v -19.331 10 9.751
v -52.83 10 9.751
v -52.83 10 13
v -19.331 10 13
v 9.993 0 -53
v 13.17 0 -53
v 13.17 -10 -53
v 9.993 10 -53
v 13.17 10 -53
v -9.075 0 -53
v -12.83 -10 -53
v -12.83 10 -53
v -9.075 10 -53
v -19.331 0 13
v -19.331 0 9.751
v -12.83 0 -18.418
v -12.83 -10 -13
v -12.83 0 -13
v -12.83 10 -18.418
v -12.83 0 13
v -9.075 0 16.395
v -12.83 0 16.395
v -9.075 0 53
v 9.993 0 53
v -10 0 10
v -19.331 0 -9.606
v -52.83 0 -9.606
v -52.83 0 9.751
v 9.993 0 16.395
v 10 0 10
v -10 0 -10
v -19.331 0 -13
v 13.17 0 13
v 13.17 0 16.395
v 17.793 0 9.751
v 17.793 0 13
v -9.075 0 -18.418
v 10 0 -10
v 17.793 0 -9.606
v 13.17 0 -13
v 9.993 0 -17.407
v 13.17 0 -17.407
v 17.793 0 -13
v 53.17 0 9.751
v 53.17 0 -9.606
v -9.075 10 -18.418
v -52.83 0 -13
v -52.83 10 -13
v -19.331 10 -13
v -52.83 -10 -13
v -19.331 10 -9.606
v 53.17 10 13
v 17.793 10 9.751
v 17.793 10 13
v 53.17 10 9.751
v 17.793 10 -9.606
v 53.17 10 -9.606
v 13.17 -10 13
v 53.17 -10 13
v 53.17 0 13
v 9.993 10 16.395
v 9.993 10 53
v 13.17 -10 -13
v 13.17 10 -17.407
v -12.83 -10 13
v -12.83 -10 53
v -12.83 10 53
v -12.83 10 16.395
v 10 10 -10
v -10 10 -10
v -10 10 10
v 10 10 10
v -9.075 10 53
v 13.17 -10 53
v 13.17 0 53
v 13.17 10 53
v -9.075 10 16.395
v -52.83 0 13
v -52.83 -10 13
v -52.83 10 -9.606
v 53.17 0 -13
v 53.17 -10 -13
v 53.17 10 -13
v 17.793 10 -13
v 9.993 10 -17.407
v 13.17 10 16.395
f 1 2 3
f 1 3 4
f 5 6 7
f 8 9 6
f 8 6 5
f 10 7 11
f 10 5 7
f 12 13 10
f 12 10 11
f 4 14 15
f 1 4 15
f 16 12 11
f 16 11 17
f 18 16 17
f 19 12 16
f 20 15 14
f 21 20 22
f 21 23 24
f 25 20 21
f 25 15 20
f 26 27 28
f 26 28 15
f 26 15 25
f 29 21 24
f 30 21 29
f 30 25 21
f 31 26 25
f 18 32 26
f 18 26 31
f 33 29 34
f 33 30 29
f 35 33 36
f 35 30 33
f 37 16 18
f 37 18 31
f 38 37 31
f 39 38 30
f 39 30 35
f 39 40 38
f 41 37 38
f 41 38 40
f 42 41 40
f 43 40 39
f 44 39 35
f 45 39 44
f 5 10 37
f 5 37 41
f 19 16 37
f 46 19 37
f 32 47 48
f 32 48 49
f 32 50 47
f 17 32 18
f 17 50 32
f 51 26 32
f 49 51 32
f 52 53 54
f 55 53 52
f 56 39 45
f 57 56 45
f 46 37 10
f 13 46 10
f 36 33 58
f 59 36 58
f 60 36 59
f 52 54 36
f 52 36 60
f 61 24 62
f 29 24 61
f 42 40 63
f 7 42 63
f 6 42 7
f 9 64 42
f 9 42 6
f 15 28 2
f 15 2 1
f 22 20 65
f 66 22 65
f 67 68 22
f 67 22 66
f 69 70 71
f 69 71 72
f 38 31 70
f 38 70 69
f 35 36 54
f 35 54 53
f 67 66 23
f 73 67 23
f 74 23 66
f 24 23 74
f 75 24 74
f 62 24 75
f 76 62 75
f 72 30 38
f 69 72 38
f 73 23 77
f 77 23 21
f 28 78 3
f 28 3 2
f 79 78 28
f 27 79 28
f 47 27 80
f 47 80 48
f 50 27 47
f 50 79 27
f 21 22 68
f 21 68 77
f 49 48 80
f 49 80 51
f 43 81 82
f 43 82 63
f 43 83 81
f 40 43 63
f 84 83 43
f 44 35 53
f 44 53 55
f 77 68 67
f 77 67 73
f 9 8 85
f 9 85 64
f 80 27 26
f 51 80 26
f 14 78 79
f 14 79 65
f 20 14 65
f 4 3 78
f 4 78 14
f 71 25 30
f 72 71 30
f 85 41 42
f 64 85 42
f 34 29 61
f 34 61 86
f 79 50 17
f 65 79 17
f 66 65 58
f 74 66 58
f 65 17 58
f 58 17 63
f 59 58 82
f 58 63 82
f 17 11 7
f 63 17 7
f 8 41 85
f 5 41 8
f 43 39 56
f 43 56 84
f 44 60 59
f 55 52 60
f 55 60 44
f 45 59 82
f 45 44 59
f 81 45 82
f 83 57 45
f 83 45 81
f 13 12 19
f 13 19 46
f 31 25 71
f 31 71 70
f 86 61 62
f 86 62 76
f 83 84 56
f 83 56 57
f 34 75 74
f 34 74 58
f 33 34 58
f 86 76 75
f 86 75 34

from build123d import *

# Parameters (mm, degrees)
BOSS_EXTRUDE1_DEPTH = 10
SKETCH3_W           = 20
SKETCH3_H           = 20
BOSS_EXTRUDE2_DEPTH = 10
SKETCH4_W           = 33.498835794
SKETCH4_H           = 3.393870965
SKETCH4_H_2         = 3.249417897
SKETCH4_W_2         = 3.755003636
SKETCH4_H_3         = 36.60457676
SKETCH4_W_3         = 3.177191363
SKETCH4_W_4         = 35.376725681
SKETCH4_H_4         = 35.593405283
SKETCH4_H_5         = 34.582233806
BOSS_EXTRUDE3_DEPTH = 10


with BuildPart() as part:
    # Sketch1 → Boss-Extrude1 (new body)
    with BuildSketch(Plane(origin=(0, 0, 0), x_dir=(1, 0, 0), z_dir=(0, 1, 0))):
        Polygon((-12.830188679, 53), (-12.830188679, 13), (-52.830188679, 13), (-52.830188679, -13), (-12.830188679, -13), (-12.830188679, -53), (13.169811321, -53), (13.169811321, -13), (53.169811321, -13), (53.169811321, 13), (13.169811321, 13), (13.169811321, 53), align=None)
    extrude(amount=-BOSS_EXTRUDE1_DEPTH)

    # Sketch3 → Boss-Extrude2 (add)
    with BuildSketch(Plane(origin=(0, 0, 0), x_dir=(1, 0, 0), z_dir=(0, 1, 0))):
        Rectangle(SKETCH3_W, SKETCH3_H)
    extrude(amount=BOSS_EXTRUDE2_DEPTH)

    # Sketch4 → Boss-Extrude3 (add)
    with BuildSketch(Plane(origin=(0, 0, 0), x_dir=(1, 0, 0), z_dir=(0, 1, 0))):
        with Locations((-36.080770782, 11.303064518)):
            Rectangle(SKETCH4_W, SKETCH4_H)
        with Locations((-36.080770782, -11.375291051)):
            Rectangle(SKETCH4_W, SKETCH4_H_2)
        with Locations((-10.952686861, -34.69771162)):
            Rectangle(SKETCH4_W_2, SKETCH4_H_3)
        with Locations((11.58121564, -34.69771162)):
            Rectangle(SKETCH4_W_3, SKETCH4_H_3)
        with Locations((35.481448481, -11.375291051)):
            Rectangle(SKETCH4_W_4, SKETCH4_H_2)
        with Locations((35.481448481, 11.303064518)):
            Rectangle(SKETCH4_W_4, SKETCH4_H)
        with Locations((11.58121564, 35.203297359)):
            Rectangle(SKETCH4_W_3, SKETCH4_H_4)
        with Locations((-10.952686861, 35.708883097)):
            Rectangle(SKETCH4_W_2, SKETCH4_H_5)
    extrude(amount=BOSS_EXTRUDE3_DEPTH)


solid = part.part
